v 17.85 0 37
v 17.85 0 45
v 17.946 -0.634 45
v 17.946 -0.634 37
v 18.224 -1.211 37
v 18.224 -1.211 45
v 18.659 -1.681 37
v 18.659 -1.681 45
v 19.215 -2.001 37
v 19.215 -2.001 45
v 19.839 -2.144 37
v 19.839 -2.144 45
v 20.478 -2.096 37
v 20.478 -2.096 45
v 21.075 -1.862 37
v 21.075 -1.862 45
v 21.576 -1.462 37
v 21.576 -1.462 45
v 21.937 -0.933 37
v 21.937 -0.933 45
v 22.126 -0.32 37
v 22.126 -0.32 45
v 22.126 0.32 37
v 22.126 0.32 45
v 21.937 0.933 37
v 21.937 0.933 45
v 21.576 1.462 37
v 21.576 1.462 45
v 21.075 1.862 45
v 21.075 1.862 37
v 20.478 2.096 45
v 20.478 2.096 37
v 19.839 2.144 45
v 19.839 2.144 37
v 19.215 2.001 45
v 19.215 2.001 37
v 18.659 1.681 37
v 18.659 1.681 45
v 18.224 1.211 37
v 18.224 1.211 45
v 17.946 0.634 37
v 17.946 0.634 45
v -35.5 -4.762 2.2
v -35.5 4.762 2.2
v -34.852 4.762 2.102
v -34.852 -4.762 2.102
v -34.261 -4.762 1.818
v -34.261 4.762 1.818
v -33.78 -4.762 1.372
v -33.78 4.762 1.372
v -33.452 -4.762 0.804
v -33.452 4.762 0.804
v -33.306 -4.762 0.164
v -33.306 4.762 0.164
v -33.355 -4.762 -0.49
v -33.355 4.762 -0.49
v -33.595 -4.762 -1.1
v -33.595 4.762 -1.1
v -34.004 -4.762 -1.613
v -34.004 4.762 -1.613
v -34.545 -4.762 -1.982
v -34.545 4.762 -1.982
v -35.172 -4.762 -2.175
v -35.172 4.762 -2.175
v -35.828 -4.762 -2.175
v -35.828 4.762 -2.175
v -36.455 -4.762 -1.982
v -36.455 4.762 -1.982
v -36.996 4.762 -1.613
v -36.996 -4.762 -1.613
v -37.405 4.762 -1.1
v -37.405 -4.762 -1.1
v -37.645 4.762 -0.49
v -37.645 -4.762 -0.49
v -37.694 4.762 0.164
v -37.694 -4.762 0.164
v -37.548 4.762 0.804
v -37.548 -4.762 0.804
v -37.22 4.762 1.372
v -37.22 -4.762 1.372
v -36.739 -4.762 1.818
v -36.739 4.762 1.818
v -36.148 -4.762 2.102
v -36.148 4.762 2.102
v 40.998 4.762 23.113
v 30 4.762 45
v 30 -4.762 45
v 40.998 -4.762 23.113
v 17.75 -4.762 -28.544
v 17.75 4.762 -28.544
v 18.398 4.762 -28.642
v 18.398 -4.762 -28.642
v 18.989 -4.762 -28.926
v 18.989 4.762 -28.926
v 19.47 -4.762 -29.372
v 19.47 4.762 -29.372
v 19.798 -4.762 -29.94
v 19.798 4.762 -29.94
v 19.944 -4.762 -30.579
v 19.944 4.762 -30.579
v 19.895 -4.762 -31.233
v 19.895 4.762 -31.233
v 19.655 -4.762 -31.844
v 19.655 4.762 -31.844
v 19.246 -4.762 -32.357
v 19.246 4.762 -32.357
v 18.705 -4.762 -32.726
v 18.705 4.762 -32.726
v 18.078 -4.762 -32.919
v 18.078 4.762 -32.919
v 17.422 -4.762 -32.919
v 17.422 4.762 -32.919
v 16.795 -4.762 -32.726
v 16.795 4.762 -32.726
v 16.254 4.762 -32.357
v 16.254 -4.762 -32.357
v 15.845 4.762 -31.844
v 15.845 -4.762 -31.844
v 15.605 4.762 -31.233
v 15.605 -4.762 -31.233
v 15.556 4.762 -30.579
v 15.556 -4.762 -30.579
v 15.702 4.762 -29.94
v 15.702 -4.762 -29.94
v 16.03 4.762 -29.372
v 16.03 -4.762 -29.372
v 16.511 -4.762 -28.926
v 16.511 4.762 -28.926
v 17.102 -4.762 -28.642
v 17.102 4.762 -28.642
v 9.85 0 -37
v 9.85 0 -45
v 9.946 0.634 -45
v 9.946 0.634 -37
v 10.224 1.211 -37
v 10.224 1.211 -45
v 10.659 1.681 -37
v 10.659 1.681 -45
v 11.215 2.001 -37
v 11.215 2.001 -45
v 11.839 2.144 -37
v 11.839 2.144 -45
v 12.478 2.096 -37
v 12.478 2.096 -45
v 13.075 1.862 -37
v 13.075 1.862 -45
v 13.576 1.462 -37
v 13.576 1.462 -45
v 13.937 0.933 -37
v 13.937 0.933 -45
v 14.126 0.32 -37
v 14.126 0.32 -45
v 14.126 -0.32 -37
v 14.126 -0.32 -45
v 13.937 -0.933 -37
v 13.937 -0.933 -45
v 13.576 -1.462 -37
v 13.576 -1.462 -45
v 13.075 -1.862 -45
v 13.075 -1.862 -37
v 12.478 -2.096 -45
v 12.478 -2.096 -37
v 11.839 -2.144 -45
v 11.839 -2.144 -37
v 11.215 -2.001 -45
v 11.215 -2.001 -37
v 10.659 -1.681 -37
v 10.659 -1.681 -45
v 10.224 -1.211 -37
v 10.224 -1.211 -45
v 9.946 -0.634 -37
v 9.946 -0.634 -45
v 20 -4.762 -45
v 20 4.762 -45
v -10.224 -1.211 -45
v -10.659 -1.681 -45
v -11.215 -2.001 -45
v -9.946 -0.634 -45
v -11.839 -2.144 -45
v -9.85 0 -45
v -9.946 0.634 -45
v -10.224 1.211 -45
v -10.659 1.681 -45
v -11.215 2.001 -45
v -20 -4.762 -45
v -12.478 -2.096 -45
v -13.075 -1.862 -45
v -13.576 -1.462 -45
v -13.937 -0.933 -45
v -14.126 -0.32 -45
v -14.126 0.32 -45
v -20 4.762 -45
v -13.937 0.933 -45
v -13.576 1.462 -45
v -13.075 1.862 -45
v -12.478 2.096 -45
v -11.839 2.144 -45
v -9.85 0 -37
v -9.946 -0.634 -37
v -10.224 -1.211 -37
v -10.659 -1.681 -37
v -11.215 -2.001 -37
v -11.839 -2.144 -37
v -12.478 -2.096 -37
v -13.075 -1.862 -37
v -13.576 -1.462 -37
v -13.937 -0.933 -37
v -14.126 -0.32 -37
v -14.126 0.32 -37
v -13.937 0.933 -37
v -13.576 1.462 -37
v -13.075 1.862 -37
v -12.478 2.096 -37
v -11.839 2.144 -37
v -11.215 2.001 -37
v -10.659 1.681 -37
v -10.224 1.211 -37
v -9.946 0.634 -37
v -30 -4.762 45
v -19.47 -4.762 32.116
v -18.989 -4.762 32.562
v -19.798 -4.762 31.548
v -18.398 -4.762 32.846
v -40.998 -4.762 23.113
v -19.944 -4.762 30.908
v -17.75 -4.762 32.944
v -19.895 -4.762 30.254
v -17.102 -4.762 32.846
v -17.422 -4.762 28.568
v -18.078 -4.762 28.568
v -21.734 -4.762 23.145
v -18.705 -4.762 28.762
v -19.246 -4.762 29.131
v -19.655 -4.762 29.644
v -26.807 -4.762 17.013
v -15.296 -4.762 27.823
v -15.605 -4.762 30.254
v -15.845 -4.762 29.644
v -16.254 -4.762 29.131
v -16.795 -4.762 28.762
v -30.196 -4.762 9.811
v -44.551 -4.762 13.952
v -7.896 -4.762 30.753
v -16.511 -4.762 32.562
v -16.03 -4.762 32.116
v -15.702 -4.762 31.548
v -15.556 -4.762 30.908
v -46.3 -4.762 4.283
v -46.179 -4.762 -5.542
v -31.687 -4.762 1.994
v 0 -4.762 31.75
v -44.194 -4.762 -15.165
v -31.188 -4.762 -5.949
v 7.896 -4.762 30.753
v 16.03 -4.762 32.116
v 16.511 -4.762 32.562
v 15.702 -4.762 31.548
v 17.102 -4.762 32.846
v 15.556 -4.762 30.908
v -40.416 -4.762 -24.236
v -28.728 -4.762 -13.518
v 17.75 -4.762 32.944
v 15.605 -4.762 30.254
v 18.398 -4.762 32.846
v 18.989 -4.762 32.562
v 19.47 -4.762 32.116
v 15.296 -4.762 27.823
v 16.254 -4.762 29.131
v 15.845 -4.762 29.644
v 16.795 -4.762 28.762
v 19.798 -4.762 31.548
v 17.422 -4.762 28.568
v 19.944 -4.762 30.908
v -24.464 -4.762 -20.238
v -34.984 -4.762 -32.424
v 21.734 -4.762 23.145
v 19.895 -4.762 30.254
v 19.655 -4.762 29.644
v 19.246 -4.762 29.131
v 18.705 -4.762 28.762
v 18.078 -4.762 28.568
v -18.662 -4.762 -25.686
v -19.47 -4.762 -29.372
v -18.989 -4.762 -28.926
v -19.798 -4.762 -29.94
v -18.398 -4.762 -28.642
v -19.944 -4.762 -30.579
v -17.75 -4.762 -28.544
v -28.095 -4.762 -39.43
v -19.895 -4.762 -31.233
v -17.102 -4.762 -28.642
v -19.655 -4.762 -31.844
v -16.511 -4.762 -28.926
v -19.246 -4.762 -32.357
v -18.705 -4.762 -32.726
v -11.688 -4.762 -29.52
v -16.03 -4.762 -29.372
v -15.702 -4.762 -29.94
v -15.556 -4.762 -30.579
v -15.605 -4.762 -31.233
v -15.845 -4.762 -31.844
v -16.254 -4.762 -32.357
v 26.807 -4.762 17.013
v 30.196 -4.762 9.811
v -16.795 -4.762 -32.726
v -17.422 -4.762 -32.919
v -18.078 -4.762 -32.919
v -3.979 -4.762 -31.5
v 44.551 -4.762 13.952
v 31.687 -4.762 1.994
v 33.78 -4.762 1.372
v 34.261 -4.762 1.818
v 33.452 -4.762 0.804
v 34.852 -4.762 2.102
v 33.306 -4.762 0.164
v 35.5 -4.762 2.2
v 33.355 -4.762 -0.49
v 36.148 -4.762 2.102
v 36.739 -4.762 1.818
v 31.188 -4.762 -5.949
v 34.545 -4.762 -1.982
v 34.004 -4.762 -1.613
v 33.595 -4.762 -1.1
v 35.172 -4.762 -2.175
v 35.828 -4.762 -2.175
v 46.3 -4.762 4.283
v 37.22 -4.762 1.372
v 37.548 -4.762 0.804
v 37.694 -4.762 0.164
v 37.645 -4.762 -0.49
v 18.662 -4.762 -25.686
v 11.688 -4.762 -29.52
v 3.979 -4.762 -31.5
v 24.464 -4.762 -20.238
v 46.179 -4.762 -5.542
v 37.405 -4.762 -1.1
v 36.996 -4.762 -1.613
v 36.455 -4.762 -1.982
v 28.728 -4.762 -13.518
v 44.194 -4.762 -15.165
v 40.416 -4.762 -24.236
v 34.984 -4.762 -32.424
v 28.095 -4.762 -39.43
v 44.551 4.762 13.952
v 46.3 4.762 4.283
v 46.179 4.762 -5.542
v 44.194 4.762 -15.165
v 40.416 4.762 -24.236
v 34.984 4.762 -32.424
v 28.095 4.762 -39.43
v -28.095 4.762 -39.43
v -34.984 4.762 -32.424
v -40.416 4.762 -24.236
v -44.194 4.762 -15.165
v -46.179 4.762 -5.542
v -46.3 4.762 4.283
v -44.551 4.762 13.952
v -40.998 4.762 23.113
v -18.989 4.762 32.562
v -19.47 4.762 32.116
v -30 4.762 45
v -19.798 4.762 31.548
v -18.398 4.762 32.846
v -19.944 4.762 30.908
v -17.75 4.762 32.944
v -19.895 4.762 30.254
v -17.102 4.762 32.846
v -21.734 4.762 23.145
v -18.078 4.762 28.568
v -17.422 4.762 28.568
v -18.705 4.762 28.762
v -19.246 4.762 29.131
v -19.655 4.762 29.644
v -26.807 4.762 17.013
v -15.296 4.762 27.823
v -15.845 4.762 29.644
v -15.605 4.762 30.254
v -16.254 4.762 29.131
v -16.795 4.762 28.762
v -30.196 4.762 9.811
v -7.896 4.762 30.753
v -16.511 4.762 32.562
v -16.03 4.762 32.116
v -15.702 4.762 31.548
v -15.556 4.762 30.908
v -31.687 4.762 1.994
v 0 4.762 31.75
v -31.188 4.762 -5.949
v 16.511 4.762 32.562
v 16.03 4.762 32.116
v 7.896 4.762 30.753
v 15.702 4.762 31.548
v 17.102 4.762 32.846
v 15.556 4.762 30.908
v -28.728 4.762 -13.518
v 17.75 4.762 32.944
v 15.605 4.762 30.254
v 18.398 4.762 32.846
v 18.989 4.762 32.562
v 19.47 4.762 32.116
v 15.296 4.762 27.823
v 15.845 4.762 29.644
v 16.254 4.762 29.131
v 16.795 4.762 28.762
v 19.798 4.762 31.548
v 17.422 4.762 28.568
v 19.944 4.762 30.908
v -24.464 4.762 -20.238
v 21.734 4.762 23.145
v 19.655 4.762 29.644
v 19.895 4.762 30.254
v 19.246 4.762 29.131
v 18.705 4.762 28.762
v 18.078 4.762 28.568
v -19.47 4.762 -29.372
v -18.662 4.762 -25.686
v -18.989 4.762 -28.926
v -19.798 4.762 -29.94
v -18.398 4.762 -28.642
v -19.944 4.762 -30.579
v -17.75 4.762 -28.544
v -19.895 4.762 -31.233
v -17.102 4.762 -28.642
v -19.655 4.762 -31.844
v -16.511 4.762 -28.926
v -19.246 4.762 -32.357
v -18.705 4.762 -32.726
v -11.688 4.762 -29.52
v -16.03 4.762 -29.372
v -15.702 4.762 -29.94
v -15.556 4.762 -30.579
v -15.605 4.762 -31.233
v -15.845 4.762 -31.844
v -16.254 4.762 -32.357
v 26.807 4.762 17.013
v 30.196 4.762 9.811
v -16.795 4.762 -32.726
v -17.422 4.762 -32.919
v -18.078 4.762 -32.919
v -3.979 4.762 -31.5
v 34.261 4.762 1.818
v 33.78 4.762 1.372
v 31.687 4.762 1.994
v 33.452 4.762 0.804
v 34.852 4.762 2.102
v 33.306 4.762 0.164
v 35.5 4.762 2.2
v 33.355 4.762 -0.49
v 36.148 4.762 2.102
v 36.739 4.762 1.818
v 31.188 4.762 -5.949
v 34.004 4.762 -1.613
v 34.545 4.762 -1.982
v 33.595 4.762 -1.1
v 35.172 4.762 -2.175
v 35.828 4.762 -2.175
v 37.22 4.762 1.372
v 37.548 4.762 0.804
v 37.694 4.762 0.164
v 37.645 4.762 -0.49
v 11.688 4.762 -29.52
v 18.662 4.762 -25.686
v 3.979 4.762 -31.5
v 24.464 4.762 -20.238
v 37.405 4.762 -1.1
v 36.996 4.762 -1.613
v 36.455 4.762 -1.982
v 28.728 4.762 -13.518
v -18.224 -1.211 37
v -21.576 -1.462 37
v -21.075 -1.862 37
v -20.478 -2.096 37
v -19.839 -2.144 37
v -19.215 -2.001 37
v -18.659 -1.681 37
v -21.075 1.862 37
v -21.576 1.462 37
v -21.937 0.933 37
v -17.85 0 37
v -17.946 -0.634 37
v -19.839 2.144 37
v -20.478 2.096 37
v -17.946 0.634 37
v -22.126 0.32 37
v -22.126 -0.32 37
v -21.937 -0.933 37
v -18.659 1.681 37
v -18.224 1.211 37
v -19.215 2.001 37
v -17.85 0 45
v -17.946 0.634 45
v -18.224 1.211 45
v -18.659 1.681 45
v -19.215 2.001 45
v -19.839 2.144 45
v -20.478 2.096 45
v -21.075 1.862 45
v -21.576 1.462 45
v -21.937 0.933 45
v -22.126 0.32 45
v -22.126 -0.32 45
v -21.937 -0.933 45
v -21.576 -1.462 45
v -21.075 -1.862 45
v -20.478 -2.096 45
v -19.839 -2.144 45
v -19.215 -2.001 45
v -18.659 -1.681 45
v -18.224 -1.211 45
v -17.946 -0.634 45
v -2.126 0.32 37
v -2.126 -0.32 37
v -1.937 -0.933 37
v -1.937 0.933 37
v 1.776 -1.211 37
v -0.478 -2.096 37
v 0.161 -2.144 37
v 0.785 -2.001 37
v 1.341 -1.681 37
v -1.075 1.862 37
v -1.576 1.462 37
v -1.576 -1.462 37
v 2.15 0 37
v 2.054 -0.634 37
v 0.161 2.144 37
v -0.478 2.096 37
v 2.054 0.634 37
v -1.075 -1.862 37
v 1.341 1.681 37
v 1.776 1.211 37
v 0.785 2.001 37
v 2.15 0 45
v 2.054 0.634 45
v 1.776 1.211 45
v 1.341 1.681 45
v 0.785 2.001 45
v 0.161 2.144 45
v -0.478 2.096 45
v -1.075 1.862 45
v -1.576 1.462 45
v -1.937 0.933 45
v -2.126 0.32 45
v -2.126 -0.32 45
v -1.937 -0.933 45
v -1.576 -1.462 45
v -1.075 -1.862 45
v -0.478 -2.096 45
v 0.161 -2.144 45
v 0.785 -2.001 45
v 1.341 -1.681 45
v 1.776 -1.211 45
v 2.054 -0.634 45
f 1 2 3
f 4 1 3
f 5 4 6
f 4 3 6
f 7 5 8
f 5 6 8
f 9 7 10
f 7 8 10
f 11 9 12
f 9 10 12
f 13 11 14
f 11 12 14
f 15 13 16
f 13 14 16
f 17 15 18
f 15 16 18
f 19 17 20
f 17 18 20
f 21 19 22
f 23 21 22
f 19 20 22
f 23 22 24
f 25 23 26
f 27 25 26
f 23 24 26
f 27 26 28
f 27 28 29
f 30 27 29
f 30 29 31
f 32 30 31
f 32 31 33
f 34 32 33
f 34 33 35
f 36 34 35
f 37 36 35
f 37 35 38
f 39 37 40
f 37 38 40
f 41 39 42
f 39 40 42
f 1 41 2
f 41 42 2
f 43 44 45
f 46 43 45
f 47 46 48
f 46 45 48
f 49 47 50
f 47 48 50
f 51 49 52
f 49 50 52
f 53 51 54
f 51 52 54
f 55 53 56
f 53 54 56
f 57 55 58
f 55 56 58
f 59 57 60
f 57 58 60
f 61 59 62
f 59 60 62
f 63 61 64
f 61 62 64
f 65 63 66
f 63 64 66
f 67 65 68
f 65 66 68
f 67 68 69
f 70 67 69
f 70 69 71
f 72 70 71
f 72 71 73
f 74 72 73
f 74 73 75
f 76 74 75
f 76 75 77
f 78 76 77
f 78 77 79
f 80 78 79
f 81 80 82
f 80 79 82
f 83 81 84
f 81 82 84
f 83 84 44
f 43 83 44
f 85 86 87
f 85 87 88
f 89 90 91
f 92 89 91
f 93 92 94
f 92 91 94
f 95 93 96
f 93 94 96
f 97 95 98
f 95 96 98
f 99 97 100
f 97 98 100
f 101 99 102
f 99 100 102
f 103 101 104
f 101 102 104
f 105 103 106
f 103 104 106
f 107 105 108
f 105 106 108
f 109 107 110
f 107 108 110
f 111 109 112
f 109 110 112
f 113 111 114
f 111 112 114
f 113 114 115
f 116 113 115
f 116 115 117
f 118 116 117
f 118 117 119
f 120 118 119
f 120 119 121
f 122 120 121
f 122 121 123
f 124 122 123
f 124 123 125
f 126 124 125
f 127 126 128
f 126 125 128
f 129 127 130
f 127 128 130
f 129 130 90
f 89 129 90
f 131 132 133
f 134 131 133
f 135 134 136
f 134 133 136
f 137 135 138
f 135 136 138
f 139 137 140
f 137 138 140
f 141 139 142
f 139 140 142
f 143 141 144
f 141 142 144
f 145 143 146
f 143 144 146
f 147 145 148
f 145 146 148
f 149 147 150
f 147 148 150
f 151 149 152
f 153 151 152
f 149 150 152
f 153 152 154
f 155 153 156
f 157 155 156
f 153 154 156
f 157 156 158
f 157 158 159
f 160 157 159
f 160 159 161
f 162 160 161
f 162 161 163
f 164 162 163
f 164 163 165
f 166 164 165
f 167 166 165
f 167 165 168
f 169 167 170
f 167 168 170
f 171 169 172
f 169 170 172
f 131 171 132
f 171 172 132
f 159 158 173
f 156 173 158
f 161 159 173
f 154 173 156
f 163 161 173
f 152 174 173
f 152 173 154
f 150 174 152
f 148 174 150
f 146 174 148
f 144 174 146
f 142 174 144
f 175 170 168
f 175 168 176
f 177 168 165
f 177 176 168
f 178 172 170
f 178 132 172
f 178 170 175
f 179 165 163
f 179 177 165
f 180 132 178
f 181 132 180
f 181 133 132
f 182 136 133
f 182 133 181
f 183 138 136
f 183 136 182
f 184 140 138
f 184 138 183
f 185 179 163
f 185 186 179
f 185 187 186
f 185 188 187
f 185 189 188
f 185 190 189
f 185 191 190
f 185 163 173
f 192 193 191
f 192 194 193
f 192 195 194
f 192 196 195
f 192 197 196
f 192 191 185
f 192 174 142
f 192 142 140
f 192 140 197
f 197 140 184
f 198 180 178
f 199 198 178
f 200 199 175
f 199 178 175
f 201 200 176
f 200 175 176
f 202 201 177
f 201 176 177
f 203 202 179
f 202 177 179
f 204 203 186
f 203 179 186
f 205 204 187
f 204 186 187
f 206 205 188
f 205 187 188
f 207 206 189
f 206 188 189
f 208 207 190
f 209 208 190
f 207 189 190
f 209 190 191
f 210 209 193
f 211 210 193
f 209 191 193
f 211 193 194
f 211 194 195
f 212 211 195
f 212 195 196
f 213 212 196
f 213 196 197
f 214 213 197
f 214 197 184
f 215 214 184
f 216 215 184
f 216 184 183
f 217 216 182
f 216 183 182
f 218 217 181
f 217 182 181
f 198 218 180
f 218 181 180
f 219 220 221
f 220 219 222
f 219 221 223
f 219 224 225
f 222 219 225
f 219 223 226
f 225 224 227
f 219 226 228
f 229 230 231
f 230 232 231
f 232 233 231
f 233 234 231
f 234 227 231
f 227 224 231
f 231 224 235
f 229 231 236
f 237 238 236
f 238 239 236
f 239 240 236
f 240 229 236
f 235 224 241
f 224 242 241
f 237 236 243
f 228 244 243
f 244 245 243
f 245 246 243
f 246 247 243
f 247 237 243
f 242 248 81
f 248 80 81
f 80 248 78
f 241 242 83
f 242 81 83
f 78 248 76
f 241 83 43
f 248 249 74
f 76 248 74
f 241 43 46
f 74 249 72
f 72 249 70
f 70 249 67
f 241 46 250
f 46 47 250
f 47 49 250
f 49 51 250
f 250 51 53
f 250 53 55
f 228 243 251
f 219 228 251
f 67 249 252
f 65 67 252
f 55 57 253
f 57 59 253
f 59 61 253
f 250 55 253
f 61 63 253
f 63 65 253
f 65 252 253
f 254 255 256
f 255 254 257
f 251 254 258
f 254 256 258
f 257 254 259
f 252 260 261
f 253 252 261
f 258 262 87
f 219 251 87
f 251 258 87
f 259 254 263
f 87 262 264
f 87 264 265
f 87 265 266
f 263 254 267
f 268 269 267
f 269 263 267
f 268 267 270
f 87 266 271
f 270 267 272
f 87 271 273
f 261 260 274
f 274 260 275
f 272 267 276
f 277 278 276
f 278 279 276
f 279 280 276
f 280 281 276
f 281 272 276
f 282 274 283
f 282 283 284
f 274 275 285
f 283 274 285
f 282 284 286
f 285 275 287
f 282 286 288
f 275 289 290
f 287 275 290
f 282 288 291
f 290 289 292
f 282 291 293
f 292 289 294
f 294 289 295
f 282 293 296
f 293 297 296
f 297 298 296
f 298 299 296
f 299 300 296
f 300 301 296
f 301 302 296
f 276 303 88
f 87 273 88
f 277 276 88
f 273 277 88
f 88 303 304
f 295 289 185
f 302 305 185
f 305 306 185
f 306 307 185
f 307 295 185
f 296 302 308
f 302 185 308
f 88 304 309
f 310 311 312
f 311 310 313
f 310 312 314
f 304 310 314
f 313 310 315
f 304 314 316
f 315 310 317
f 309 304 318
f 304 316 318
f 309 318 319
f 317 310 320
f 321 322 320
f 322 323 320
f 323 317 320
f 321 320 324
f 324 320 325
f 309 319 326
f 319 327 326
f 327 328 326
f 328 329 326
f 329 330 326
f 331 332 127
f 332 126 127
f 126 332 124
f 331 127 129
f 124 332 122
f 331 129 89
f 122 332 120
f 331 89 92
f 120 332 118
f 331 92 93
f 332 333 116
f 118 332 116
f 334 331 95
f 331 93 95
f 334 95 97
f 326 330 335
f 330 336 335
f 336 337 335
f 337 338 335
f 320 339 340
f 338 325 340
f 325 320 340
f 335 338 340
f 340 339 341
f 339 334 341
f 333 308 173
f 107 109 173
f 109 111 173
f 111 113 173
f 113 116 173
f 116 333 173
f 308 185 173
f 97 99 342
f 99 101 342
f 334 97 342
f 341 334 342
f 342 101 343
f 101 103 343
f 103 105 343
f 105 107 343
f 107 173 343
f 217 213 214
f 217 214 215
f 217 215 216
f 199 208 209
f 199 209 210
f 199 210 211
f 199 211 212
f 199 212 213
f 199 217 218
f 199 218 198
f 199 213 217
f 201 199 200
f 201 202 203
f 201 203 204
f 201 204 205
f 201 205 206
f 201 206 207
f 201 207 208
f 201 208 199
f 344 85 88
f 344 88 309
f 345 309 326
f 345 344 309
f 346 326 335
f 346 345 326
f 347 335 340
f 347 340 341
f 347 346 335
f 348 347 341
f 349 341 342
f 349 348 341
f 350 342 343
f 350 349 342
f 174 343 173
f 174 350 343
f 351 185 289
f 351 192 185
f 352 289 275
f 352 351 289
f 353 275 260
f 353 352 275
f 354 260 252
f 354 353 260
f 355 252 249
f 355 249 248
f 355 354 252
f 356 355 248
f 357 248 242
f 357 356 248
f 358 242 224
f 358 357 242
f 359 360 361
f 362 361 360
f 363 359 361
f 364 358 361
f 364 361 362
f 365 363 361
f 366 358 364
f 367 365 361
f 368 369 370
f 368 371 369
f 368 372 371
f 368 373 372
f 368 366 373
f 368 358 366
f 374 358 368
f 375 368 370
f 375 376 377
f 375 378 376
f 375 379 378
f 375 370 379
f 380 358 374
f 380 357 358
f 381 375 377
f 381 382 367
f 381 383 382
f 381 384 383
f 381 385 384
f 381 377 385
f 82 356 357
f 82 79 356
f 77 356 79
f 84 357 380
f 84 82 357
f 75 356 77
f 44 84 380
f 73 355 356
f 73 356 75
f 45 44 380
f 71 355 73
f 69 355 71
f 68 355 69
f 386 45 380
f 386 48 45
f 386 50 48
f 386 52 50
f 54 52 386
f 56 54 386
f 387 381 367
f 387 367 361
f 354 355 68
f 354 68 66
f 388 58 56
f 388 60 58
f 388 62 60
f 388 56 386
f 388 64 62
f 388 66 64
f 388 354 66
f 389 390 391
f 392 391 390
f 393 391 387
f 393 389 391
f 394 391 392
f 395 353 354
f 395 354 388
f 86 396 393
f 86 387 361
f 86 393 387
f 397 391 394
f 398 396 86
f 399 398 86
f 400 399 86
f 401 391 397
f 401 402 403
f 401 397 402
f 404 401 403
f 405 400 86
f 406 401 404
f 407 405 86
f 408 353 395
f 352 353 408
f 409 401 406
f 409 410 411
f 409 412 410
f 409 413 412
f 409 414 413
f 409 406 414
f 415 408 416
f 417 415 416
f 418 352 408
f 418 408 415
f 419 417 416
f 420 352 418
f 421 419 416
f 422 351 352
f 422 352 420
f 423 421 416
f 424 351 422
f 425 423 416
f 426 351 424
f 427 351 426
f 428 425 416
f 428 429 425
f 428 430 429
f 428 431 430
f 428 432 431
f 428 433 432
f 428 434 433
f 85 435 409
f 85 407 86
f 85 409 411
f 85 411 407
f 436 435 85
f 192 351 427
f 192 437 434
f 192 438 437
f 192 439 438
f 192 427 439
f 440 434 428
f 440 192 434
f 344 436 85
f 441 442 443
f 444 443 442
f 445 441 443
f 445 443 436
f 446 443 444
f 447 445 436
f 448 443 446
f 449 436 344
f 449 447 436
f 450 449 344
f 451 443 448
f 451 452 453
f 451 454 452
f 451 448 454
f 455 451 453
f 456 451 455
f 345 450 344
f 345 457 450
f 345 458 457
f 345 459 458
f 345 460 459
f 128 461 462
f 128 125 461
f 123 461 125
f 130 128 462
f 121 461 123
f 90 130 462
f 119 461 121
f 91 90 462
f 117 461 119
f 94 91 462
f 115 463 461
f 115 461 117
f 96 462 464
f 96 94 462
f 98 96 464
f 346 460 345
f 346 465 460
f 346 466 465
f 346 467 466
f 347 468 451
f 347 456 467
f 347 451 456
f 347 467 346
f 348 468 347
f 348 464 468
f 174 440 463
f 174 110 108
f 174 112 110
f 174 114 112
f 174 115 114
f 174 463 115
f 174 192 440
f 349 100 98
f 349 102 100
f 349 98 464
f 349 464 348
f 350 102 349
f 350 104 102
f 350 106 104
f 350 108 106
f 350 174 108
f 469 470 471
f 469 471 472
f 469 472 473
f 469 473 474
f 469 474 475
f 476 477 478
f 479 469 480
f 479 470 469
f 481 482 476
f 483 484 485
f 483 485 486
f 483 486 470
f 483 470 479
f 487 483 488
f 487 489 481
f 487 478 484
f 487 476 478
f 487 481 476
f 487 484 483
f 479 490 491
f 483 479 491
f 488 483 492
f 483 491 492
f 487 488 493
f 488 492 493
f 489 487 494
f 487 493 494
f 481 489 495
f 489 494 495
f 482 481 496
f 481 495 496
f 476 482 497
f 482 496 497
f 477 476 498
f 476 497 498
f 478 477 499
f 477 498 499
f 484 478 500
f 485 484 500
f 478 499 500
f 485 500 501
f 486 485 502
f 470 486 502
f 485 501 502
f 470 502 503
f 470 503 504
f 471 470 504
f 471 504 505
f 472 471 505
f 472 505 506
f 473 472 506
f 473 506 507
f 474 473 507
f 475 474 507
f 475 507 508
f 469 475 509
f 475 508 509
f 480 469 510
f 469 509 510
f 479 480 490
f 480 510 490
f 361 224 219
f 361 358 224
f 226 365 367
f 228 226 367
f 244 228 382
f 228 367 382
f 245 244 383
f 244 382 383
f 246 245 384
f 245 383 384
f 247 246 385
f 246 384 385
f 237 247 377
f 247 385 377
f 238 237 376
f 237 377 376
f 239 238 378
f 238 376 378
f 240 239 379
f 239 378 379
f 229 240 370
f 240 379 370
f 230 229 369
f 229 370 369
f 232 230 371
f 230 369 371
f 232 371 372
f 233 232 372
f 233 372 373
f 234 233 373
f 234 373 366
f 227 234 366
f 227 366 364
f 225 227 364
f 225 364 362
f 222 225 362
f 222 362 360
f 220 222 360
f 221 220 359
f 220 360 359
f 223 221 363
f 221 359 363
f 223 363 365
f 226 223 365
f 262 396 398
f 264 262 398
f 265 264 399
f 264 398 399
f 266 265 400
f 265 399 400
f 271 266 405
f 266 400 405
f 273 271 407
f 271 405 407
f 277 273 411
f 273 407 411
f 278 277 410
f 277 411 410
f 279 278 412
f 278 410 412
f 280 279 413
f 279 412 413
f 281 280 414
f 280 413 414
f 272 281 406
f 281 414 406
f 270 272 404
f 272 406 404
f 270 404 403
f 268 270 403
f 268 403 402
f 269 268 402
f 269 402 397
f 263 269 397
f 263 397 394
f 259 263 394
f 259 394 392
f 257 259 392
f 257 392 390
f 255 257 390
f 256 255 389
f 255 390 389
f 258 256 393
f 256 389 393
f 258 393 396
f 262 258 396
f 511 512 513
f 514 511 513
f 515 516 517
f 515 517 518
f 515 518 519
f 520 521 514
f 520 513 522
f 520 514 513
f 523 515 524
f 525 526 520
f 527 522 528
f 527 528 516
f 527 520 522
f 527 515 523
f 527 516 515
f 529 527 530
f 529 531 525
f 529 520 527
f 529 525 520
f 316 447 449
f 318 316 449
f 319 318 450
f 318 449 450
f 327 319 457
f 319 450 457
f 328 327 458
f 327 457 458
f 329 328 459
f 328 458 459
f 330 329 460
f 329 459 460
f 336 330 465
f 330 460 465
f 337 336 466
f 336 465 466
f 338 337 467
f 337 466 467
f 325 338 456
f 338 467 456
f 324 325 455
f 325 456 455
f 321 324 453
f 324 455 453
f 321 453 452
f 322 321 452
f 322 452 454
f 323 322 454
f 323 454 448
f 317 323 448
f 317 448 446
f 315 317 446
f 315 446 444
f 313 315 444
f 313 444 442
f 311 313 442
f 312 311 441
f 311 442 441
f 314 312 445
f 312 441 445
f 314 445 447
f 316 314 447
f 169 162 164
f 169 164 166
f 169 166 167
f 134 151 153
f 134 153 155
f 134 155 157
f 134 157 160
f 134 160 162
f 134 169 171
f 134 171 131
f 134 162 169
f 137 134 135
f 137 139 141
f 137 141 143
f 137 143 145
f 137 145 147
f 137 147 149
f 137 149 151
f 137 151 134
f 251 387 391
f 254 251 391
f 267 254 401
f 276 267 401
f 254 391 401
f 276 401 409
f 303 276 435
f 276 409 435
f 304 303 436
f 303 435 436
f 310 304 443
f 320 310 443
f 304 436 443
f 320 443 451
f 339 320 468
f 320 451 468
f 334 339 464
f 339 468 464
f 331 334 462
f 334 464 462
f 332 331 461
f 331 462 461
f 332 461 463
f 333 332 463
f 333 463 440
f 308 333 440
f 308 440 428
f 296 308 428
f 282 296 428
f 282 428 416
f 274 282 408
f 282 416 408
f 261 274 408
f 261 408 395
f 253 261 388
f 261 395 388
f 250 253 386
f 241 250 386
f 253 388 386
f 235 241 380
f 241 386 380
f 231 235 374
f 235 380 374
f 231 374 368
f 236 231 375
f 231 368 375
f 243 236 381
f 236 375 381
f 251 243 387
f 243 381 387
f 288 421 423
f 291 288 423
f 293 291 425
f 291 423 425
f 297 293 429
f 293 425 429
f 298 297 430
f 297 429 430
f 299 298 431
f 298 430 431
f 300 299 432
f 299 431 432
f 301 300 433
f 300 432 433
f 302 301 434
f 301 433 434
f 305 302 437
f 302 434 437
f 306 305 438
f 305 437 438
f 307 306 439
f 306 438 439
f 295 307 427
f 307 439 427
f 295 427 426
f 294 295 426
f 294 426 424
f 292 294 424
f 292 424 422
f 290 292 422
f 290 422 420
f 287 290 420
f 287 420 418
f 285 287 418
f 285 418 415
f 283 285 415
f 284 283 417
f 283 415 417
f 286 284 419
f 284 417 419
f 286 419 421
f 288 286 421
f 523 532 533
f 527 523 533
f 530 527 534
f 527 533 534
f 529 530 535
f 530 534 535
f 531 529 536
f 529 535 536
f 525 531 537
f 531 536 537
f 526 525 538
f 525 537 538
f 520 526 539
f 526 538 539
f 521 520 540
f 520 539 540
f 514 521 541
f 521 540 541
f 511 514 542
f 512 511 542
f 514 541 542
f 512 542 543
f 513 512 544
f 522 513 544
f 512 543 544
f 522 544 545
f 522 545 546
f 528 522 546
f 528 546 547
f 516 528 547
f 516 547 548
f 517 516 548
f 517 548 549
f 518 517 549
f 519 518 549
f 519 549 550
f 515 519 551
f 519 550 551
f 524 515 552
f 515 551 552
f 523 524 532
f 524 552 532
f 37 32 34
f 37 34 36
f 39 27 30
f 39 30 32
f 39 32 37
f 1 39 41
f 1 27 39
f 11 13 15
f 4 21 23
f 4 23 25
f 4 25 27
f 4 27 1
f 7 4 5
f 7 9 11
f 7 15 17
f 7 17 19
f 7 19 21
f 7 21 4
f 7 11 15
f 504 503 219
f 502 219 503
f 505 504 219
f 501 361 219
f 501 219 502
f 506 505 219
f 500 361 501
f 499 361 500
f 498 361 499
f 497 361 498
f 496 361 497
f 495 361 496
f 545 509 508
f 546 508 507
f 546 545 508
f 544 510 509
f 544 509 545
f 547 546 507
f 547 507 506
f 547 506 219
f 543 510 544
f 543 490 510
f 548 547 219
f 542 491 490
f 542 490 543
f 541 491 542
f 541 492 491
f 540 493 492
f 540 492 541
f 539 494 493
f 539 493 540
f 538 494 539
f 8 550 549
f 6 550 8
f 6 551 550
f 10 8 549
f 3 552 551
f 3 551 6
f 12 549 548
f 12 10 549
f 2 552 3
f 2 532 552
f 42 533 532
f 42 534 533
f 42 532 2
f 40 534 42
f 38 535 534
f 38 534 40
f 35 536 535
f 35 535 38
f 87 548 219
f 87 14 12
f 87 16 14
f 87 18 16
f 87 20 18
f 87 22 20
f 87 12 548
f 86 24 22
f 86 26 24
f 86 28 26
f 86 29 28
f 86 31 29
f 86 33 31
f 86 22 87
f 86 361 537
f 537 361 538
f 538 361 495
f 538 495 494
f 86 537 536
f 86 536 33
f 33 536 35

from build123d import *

# Parameters (mm, degrees)
F_3_8INCH_DEPTH    = 4.7625
SKETCH2_R          = 31.75
CUT_EXTRUDE1_DEPTH = 9.525
SKETCH3_R          = 2.2
M4_THROUGH_DEPTH   = 9.525
SKETCH4_R          = 2.15
M5X8_DRILL_DEPTH   = 8
SKETCH5_R          = 2.15
M5X8_DRILL2_DEPTH  = 8


with BuildPart() as part:
    # Sketch1 → 3/8inch (new, symmetric)
    with BuildSketch(Plane(origin=(0, 0, 0), x_dir=(1, 0, 0), z_dir=(0, 1, 0))):
        with BuildLine():
            Line((-30, -45), (30, -45))
            Line((30, -45), (40.997797218, -23.112824386))
            ThreePointArc((40.997797218, -23.112824386), (44.19360745, 15.165387766), (20, 45))
            Line((20, 45), (-20, 45))
            ThreePointArc((-20, 45), (-44.19360745, 15.165387766), (-40.997797218, -23.112824386))
            Line((-40.997797218, -23.112824386), (-30, -45))
        make_face()
    extrude(amount=F_3_8INCH_DEPTH, both=True)

    # Sketch2 → Cut-Extrude1 (cut)
    with BuildSketch(Plane(origin=(0, 4.7625, 0), x_dir=(1, 0, 0), z_dir=(0, 1, 0))):
        with Locations(Location((0, 0, 0), (0, 0, 270))):
            Circle(SKETCH2_R)
    extrude(amount=-CUT_EXTRUDE1_DEPTH, mode=Mode.SUBTRACT)

    # Sketch3 → M4_through (cut)
    with BuildSketch(Plane(origin=(0, 4.7625, 0), x_dir=(1, 0, 0), z_dir=(0, 1, 0))):
        with Locations(Location((17.75, 30.743901834, 0), (0, 0, 270))):
            Circle(SKETCH3_R)
        with Locations(Location((35.5, 0, 0), (0, 0, 270))):
            Circle(SKETCH3_R)
        with Locations(Location((17.75, -30.743901834, 0), (0, 0, 270))):
            Circle(SKETCH3_R)
        with Locations(Location((-17.75, -30.743901834, 0), (0, 0, 270))):
            Circle(SKETCH3_R)
        with Locations(Location((-35.5, 0, 0), (0, 0, 270))):
            Circle(SKETCH3_R)
        with Locations(Location((-17.75, 30.743901834, 0), (0, 0, 270))):
            Circle(SKETCH3_R)
    extrude(amount=-M4_THROUGH_DEPTH, mode=Mode.SUBTRACT)

    # Sketch4 → M5x8_DRILL (cut)
    with BuildSketch(Plane(origin=(0, 0, -45), x_dir=(-1, 0, 0), z_dir=(0, 0, -1))):
        with Locations((-12, 0)):
            Circle(SKETCH4_R)
        with Locations(Location((12, 0, 0), (0, 0, 180))):
            Circle(SKETCH4_R)
    extrude(amount=-M5X8_DRILL_DEPTH, mode=Mode.SUBTRACT)

    # Sketch5 → M5x8_DRILL2 (cut)
    with BuildSketch(Plane.XY.offset(45)):
        with Locations((-20, 0)):
            Circle(SKETCH5_R)
        with Locations(Location((20, 0, 0), (0, 0, 180))):
            Circle(SKETCH5_R)
        Circle(SKETCH5_R)
    extrude(amount=-M5X8_DRILL2_DEPTH, mode=Mode.SUBTRACT)


solid = part.part
